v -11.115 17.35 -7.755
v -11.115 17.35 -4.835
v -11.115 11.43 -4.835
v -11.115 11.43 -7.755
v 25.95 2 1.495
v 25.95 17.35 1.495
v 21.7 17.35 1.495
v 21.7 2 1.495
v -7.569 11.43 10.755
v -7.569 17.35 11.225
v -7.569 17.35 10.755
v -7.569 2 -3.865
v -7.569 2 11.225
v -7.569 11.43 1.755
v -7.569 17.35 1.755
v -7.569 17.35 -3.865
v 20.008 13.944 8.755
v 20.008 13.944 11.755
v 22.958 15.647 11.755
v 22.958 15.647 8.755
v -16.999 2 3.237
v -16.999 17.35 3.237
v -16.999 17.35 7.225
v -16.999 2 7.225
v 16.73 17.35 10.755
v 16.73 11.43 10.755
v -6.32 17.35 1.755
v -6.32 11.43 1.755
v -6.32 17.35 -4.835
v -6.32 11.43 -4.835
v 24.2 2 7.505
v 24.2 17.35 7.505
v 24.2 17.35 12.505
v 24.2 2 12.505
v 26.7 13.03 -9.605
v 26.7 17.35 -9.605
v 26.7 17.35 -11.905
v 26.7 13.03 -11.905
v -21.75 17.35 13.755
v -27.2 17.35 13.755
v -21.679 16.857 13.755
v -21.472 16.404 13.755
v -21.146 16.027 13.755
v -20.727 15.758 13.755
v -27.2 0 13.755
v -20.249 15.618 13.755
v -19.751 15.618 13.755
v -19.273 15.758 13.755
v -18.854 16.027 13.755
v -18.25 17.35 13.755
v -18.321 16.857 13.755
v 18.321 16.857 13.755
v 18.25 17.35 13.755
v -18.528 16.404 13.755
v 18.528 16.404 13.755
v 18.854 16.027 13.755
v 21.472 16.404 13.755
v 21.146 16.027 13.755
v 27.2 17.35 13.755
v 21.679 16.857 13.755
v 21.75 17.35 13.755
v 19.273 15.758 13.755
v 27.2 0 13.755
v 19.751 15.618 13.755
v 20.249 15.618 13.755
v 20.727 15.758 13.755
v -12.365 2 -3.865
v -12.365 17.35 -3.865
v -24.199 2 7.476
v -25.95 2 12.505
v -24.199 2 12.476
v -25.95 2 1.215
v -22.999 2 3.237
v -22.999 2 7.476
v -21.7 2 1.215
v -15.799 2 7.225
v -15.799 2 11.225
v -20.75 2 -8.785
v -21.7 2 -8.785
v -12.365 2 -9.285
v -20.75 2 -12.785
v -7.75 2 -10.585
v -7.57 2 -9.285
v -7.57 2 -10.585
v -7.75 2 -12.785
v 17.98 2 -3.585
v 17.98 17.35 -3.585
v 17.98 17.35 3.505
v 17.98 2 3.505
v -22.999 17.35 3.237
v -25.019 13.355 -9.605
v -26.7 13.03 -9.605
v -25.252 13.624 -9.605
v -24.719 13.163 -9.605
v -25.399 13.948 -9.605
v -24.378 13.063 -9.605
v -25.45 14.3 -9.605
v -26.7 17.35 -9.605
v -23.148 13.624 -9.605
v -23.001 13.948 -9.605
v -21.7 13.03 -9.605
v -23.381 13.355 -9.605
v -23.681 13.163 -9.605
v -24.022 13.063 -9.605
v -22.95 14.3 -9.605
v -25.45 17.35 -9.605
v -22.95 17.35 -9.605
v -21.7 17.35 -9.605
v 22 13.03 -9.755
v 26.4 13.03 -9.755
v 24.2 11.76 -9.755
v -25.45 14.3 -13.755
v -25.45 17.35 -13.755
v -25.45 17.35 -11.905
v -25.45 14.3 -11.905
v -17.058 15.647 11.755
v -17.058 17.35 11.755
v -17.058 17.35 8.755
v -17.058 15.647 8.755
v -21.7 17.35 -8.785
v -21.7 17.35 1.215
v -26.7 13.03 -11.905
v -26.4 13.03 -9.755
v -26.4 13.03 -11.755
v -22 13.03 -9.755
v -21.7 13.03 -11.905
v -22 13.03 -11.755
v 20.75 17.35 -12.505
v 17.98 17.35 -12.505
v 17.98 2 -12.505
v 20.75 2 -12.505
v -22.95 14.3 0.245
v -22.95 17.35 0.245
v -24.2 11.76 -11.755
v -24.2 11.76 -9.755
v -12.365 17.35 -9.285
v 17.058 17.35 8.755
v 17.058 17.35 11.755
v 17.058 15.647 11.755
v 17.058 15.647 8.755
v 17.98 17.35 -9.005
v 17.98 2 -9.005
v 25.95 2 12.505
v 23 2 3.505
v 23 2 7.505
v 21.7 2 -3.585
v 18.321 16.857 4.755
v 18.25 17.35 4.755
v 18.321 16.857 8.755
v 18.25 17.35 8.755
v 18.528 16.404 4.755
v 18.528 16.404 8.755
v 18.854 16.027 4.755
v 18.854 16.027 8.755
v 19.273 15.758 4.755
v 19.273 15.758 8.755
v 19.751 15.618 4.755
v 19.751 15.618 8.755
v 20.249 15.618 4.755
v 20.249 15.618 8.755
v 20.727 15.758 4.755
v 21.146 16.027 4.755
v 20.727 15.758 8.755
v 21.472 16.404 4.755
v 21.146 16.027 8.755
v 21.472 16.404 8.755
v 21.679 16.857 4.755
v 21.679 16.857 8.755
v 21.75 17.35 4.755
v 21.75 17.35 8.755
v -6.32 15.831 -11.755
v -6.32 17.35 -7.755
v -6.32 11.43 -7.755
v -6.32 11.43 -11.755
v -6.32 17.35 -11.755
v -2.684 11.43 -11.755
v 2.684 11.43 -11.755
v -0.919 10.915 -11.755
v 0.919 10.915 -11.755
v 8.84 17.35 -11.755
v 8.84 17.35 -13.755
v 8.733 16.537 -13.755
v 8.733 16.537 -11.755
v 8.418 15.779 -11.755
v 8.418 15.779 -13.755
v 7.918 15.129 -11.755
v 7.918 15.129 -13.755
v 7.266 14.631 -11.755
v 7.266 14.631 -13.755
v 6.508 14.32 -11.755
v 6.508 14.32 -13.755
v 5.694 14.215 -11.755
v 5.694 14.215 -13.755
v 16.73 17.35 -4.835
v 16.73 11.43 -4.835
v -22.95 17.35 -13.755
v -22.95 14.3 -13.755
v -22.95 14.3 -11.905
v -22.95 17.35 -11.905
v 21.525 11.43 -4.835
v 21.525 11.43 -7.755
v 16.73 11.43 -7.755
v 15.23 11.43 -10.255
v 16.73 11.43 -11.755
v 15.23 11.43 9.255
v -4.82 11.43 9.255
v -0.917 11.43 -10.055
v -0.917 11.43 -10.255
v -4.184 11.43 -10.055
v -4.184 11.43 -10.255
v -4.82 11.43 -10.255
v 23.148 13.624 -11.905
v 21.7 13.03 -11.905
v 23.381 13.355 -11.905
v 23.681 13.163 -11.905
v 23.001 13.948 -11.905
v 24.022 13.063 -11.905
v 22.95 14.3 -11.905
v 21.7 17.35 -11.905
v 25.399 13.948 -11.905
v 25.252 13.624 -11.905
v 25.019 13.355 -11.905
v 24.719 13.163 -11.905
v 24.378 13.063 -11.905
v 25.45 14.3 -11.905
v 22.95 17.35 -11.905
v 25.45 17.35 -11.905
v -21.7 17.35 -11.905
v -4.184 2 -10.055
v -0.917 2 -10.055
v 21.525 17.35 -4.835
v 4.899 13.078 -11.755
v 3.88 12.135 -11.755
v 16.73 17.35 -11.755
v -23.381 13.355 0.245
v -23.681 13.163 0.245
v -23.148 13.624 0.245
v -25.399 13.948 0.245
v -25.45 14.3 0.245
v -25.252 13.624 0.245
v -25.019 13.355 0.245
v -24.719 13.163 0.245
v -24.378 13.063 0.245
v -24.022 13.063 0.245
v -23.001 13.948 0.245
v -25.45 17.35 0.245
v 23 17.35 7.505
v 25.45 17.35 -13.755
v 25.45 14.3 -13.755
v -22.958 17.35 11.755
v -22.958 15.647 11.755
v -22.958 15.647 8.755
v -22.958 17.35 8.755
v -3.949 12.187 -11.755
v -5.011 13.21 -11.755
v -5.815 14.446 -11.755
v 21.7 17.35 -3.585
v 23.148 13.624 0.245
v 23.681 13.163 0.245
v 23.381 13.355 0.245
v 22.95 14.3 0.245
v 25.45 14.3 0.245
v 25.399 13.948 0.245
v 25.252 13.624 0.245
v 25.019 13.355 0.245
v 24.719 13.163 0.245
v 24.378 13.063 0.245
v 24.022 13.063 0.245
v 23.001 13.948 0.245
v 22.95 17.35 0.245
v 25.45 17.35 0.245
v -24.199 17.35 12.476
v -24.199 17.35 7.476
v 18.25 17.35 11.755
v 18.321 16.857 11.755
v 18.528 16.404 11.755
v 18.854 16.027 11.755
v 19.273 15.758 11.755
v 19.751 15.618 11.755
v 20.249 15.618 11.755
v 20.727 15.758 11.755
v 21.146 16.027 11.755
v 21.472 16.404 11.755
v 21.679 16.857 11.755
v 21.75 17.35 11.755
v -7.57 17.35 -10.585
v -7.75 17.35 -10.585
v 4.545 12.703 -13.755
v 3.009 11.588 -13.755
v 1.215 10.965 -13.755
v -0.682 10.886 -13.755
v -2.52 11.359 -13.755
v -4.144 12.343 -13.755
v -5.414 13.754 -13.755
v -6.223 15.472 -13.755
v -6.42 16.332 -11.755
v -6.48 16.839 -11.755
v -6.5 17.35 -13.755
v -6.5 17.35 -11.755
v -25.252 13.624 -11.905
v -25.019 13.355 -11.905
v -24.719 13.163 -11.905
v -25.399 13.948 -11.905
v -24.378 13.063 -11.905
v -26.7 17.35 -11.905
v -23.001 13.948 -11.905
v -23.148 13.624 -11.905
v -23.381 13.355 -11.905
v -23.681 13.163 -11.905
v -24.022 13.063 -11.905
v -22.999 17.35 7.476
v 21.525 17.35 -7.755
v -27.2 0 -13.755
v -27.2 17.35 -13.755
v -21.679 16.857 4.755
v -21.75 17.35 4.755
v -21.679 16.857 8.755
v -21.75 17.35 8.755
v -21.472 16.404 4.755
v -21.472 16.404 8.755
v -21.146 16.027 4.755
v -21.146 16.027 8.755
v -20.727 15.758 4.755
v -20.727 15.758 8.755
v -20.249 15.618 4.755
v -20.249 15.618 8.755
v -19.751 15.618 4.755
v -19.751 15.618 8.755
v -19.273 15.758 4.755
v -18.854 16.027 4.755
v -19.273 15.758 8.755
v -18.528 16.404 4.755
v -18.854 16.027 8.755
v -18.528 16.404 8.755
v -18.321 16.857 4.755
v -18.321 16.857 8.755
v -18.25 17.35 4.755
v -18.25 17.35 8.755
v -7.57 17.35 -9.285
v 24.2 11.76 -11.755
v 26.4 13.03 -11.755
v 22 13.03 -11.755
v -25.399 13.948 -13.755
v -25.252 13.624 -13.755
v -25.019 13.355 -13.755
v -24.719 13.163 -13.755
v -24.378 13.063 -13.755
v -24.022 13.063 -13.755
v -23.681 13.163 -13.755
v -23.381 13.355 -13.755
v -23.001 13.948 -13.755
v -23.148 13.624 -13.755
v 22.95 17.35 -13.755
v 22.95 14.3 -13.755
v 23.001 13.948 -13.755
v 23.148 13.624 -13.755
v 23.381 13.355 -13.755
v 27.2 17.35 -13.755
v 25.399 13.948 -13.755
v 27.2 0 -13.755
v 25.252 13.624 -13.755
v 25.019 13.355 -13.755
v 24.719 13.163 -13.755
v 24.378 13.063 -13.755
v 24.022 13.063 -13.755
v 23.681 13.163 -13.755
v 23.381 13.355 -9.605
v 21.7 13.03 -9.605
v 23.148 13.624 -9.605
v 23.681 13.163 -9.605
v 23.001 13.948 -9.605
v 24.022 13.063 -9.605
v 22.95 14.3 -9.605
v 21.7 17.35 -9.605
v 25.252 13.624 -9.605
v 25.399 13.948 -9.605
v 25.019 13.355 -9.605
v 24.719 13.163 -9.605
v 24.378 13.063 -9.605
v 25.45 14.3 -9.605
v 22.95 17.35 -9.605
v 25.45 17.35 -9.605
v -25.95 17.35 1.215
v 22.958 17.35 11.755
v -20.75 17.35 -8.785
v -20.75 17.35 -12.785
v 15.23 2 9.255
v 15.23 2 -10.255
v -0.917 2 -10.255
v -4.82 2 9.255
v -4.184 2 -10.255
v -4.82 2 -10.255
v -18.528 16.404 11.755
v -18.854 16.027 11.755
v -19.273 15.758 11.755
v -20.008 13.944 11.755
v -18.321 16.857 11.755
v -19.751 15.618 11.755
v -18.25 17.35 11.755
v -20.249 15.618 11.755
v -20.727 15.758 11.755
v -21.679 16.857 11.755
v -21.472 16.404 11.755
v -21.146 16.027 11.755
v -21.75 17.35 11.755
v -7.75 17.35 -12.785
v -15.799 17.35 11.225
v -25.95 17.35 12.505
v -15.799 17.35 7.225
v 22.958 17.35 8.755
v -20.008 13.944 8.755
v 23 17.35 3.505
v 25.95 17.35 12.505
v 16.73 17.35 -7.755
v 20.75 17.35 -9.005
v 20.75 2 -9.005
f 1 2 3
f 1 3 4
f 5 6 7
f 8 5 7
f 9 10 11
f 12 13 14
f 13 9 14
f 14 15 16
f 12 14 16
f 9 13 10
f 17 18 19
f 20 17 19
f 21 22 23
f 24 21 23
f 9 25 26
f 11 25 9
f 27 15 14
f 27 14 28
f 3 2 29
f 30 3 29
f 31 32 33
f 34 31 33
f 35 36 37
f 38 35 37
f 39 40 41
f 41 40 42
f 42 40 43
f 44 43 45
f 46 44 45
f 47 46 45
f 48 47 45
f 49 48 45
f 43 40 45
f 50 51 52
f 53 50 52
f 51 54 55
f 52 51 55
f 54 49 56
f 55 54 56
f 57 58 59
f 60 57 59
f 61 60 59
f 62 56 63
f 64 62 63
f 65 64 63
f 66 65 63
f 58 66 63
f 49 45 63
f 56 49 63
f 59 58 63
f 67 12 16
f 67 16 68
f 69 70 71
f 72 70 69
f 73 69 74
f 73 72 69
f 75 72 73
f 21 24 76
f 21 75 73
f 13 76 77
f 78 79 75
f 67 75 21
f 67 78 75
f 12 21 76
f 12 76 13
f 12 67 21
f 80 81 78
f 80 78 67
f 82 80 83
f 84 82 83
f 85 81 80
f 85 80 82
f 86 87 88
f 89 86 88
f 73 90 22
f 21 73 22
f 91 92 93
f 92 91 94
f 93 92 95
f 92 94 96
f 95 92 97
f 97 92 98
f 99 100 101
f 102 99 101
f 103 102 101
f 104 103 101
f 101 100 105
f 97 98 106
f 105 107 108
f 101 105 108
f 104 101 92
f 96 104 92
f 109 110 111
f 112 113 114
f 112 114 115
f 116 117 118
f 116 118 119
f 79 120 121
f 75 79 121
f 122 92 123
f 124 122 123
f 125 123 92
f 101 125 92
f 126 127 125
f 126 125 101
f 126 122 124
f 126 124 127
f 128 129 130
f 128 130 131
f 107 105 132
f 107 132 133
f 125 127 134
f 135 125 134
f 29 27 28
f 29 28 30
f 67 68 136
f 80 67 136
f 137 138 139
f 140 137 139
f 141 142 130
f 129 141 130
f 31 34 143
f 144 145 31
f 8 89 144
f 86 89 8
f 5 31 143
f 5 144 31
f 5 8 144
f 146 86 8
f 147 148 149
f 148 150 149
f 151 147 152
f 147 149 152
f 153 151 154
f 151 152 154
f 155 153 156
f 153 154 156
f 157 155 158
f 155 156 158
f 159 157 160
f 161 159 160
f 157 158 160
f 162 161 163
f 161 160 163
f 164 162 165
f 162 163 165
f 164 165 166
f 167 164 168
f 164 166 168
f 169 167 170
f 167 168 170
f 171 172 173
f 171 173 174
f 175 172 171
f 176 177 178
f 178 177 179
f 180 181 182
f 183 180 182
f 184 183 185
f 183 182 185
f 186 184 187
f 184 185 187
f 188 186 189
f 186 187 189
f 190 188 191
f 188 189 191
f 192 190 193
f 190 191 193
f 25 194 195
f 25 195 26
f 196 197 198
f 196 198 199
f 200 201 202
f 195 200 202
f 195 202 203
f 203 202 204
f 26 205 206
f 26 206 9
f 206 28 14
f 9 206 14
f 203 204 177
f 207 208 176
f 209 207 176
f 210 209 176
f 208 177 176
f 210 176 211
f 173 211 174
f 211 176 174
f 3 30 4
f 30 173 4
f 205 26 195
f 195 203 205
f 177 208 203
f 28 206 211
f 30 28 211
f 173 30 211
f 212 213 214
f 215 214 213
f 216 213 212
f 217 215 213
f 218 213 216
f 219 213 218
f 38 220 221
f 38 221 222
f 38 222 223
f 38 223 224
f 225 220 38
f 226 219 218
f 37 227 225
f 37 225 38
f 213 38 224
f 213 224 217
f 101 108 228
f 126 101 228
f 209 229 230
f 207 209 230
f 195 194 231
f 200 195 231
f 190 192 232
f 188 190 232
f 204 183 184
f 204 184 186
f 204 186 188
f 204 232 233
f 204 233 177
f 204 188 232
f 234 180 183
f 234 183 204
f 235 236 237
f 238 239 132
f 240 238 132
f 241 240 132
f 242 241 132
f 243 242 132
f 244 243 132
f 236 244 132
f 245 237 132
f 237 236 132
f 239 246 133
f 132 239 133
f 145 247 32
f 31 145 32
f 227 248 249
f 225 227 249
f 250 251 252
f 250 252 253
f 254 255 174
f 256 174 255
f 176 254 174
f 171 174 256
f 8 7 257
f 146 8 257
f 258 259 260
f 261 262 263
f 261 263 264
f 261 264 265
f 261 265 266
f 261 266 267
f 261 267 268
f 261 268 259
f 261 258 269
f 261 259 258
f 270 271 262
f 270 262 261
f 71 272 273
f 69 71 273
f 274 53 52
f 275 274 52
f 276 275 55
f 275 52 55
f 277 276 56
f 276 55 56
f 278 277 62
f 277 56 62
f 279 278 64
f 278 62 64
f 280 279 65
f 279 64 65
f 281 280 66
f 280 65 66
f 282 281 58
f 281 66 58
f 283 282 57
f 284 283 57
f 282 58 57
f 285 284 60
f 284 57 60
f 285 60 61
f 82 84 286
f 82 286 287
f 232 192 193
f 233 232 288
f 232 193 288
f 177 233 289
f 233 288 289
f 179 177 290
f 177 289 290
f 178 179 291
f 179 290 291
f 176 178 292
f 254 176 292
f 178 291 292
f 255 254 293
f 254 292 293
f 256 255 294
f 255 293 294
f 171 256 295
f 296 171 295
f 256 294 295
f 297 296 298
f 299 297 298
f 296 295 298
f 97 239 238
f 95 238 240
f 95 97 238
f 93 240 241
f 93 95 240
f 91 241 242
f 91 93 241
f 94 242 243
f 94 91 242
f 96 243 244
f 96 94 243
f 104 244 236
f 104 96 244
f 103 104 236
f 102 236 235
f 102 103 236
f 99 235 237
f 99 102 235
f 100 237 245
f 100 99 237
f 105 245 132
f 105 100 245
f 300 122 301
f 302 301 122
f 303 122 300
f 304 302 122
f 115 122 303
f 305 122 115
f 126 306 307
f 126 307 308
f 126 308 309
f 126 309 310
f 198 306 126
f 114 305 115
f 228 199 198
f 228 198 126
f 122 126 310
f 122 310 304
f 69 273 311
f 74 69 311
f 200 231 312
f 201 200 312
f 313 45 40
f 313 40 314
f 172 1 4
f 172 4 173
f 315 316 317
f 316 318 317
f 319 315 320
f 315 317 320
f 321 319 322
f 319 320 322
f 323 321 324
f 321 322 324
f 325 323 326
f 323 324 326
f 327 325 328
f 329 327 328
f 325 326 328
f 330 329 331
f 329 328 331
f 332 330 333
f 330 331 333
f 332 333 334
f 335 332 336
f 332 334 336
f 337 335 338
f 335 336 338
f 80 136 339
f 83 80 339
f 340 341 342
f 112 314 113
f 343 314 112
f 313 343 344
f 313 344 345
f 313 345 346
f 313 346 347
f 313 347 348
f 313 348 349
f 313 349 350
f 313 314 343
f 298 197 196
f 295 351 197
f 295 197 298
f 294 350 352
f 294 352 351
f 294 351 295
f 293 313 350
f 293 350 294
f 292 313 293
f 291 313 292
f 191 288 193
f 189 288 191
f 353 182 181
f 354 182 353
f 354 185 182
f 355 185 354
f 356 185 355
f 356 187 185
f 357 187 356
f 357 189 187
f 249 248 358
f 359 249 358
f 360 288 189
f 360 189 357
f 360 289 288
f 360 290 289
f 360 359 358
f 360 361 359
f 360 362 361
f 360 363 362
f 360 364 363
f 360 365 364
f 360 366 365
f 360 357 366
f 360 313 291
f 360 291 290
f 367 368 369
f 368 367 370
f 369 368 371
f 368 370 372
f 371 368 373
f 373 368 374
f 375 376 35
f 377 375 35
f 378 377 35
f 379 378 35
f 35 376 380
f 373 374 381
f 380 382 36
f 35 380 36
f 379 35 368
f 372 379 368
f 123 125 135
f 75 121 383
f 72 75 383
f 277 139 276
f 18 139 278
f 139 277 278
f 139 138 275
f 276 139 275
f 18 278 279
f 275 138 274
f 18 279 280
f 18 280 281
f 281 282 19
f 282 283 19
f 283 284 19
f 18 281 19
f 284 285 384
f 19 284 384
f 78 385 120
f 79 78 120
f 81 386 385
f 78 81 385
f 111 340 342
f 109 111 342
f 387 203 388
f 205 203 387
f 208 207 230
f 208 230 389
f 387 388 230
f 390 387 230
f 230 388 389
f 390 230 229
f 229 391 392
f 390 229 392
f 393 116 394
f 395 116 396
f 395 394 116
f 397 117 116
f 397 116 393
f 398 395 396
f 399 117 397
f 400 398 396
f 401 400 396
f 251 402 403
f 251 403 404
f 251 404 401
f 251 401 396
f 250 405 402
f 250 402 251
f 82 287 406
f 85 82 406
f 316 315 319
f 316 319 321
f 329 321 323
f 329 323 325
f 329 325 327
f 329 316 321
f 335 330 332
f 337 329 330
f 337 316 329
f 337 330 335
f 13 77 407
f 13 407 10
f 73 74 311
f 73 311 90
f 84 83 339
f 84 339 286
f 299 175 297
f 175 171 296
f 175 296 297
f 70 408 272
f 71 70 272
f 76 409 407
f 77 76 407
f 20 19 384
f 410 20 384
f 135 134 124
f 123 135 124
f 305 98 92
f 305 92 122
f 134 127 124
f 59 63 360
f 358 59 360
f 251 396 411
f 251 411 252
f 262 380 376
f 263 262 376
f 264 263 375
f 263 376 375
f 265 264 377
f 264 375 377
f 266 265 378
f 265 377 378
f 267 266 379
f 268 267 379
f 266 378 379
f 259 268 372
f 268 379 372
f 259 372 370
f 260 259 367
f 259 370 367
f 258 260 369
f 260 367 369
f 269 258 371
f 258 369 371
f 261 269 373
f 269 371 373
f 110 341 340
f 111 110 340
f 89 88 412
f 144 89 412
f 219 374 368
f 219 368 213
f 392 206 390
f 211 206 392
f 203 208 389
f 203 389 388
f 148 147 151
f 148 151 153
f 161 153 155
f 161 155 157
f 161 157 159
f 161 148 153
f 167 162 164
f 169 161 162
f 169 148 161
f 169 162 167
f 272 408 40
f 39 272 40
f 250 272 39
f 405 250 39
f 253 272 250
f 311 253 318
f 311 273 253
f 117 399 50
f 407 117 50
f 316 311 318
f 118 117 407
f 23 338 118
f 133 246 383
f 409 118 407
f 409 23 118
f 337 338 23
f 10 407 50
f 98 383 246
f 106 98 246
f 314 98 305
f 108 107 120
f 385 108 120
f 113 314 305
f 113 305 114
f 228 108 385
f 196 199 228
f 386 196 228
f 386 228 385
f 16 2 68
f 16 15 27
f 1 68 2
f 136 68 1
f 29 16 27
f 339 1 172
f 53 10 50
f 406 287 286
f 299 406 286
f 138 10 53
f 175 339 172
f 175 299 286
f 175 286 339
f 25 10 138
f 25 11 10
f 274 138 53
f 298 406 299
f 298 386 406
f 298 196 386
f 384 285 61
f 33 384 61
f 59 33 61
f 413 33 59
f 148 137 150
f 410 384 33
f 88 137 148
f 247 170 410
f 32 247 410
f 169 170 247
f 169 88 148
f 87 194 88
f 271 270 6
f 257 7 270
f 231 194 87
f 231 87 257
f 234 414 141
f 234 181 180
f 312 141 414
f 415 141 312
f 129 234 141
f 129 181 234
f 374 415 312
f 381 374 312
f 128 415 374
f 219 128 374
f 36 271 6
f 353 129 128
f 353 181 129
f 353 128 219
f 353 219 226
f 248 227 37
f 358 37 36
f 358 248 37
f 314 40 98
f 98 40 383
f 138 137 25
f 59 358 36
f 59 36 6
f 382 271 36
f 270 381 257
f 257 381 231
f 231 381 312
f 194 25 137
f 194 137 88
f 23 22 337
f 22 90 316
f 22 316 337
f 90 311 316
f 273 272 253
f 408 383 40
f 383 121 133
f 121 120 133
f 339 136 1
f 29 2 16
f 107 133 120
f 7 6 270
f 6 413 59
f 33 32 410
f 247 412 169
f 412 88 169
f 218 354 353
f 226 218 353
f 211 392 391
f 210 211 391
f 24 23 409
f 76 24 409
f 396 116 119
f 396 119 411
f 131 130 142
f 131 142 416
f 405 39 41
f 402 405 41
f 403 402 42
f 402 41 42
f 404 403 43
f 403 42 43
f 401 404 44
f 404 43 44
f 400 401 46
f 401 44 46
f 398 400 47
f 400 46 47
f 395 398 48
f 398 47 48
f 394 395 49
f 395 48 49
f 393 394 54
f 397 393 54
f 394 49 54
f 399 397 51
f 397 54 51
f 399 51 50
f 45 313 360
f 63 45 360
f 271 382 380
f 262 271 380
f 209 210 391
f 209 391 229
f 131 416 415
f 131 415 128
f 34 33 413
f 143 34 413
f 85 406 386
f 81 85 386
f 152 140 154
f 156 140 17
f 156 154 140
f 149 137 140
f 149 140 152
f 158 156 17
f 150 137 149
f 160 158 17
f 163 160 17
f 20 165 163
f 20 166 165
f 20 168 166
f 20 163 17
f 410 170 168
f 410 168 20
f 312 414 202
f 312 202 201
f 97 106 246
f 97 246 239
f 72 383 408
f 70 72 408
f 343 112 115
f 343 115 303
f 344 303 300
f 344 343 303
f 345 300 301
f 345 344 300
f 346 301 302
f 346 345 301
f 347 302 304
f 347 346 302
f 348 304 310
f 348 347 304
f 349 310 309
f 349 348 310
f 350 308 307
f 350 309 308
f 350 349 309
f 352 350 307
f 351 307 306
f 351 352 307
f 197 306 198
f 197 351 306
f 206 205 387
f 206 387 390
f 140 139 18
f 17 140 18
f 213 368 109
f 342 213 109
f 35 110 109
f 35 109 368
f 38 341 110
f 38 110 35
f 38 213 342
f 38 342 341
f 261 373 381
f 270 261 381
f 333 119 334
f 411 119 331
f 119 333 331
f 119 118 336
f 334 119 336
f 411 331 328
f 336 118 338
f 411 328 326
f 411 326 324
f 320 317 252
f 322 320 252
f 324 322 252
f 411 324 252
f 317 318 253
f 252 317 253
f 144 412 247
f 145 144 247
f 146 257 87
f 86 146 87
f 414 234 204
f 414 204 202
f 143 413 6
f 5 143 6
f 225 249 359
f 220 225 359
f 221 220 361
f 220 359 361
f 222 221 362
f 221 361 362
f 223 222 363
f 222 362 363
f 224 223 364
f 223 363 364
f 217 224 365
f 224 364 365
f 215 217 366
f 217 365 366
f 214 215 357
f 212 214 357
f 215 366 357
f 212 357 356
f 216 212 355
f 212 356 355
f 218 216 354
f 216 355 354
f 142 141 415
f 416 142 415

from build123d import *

# Parameters (mm, degrees)
SKETCH1_W           = 54.3999928
SKETCH1_H           = 27.5100034
BOSS_EXTRUDE1_DEPTH = 17.3500034
CUT_EXTRUDE1_DEPTH  = 15.3500074
CUT_EXTRUDE2_DEPTH  = 5.9200034
CUT_EXTRUDE3_DEPTH  = 9.430004
SKETCH5_W           = 4.795012
SKETCH5_H           = 2.9200094
CUT_EXTRUDE4_DEPTH  = 5.9200034
SKETCH6_W           = 2.769997
SKETCH6_H           = 3.499993
CUT_EXTRUDE5_DEPTH  = 15.3500074
CUT_EXTRUDE6_DEPTH  = 15.3500074
SKETCH8_R           = 1.7499965
CUT_EXTRUDE7_DEPTH  = 9.0000074
CUT_EXTRUDE8_DEPTH  = 13.9999974
SKETCH10_W          = 4.99999
SKETCH10_H          = 2.2999954
CUT_EXTRUDE9_DEPTH  = 4.320159
CUT_EXTRUDE10_DEPTH = 1.999996
CUT_EXTRUDE11_DEPTH = 2.999994
CUT_EXTRUDE12_DEPTH = 1.999996


with BuildPart() as part:
    # Sketch1 → Boss-Extrude1 (new body)
    with BuildSketch(Plane(origin=(0, 0, 0), x_dir=(1, 0, 0), z_dir=(0, 1, 0))):
        Rectangle(SKETCH1_W, SKETCH1_H)
    extrude(amount=BOSS_EXTRUDE1_DEPTH)

    # Sketch2 → Cut-Extrude1 (cut)
    with BuildSketch(Plane(origin=(0, 17.3500034, 0), x_dir=(1, 0, 0), z_dir=(0, 1, 0))):
        Polygon((-7.7499972, 12.7852805), (-20.7499966, 12.7852805), (-20.7499712, 8.7852885), (-21.699982, 8.7852885), (-21.699982, -1.2147169), (-25.9499862, -1.2147169), (-25.9499862, -12.5049915), (-24.199309728, -12.476075327), (-24.199309728, -7.476085327), (-22.999312128, -7.476085327), (-22.999312128, -3.2369379), (-16.999324128, -3.2369379), (-16.999324128, -7.2247379), (-15.799326528, -7.2247379), (-15.799326528, -11.2247299), (-7.569320128, -11.2247299), (-7.569320128, 3.8652831), (-12.364974, 3.8652831), (-12.364974, 9.2852875), (-7.5699874, 9.2852875), (-7.5699874, 10.5852849), (-7.7499972, 10.5852849), align=None)
    extrude(amount=-CUT_EXTRUDE1_DEPTH, mode=Mode.SUBTRACT)

    # Sketch3 → Cut-Extrude2 (cut)
    with BuildSketch(Plane(origin=(0, 17.3500034, 0), x_dir=(1, 0, 0), z_dir=(0, 1, 0))):
        Polygon((-7.5699874, -10.7550077), (-7.5699874, -1.7550003), (-6.3199772, -1.7550003), (-6.3199772, 11.7550057), (16.7300148, 11.7550057), (16.7300148, -10.7550077), align=None)
    extrude(amount=-CUT_EXTRUDE2_DEPTH, mode=Mode.SUBTRACT)

    # Sketch4 → Cut-Extrude3 (cut)
    with BuildSketch(Plane(origin=(0, 11.43, 0), x_dir=(1, 0, 0), z_dir=(0, 1, 0))):
        Polygon((15.2300178, 10.2550087), (15.2300178, -9.2549853), (-4.8199802, -9.2549853), (-4.8199802, 10.2550087), (-4.1839388, 10.2550087), (-4.1839388, 10.0550091), (-0.916671965, 10.0550091), (-0.916671965, 10.2550087), align=None)
    extrude(amount=-CUT_EXTRUDE3_DEPTH, mode=Mode.SUBTRACT)

    # Sketch5 → Cut-Extrude4 (cut)
    with BuildSketch(Plane(origin=(0, 17.3500034, 0), x_dir=(1, 0, 0), z_dir=(0, 1, 0))):
        with Locations((-8.7174832, 6.2949836)):
            Rectangle(SKETCH5_W, SKETCH5_H)
        with Locations((19.1275208, 6.2949836)):
            Rectangle(SKETCH5_W, SKETCH5_H)
    extrude(amount=-CUT_EXTRUDE4_DEPTH, mode=Mode.SUBTRACT)

    # Sketch6 → Cut-Extrude5 (cut)
    with BuildSketch(Plane(origin=(0, 17.3500034, 0), x_dir=(1, 0, 0), z_dir=(0, 1, 0))):
        with Locations((19.3649981, 10.754995)):
            Rectangle(SKETCH6_W, SKETCH6_H)
    extrude(amount=-CUT_EXTRUDE5_DEPTH, mode=Mode.SUBTRACT)

    # Sketch7 → Cut-Extrude6 (cut)
    with BuildSketch(Plane(origin=(0, 17.3500034, 0), x_dir=(1, 0, 0), z_dir=(0, 1, 0))):
        Polygon((21.7000074, 3.5849941), (17.9799996, 3.5849941), (17.9799996, -3.5050095), (23.0000048, -3.5050095), (23.0000048, -7.5050015), (24.2000024, -7.5050015), (24.2000024, -12.5049915), (25.9500116, -12.5049915), (25.9500116, -1.4949805), (21.7000074, -1.4949805), align=None)
    extrude(amount=-CUT_EXTRUDE6_DEPTH, mode=Mode.SUBTRACT)

    # Sketch8 → Cut-Extrude7 (cut)
    with BuildSketch(Plane.XY.offset(13.7550017)):
        with Locations((-19.9999981, 17.3500034)):
            Circle(SKETCH8_R)
        with Locations((19.9999981, 17.3500034)):
            Circle(SKETCH8_R)
    extrude(amount=-CUT_EXTRUDE7_DEPTH, mode=Mode.SUBTRACT)

    # Sketch9 → Cut-Extrude8 (cut)
    with BuildSketch(Plane(origin=(0, 0, -13.7550017), x_dir=(-1, 0, 0), z_dir=(0, 0, -1))):
        with BuildLine():
            Line((-25.4499872, 17.3500034), (-25.4499872, 14.2999968))
            ThreePointArc((-25.4499872, 14.2999968), (-24.1999897, 13.0499993), (-22.9499922, 14.2999968))
            Line((-22.9499922, 14.2999968), (-22.9499922, 17.3500034))
            Line((-22.9499922, 17.3500034), (-25.4499872, 17.3500034))
        make_face()
        with BuildLine():
            Line((22.9499922, 17.3500034), (25.4499872, 17.3500034))
            Line((25.4499872, 17.3500034), (25.4499872, 14.2999968))
            ThreePointArc((25.4499872, 14.2999968), (24.1999897, 13.0499993), (22.9499922, 14.2999968))
            Line((22.9499922, 14.2999968), (22.9499922, 17.3500034))
        make_face()
    extrude(amount=-CUT_EXTRUDE8_DEPTH, mode=Mode.SUBTRACT)

    # Sketch10 → Cut-Extrude9 (cut)
    with BuildSketch(Plane(origin=(0, 17.3500034, 0), x_dir=(1, 0, 0), z_dir=(0, 1, 0))):
        with Locations((-24.2000024, 10.754995)):
            Rectangle(SKETCH10_W, SKETCH10_H)
        with Locations((24.2000024, 10.754995)):
            Rectangle(SKETCH10_W, SKETCH10_H)
    extrude(amount=-CUT_EXTRUDE9_DEPTH, mode=Mode.SUBTRACT)

    # Sketch11 → Cut-Extrude10 (cut)
    with BuildSketch(Plane(origin=(0, 0, -11.7550057), x_dir=(-1, 0, 0), z_dir=(0, 0, -1))):
        Polygon((-26.399998, 13.0298444), (-24.2000024, 11.7596666), (-22.0000068, 13.0298444), align=None)
        Polygon((22.0000068, 13.0298444), (24.2000024, 11.7596666), (26.399998, 13.0298444), align=None)
    extrude(amount=-CUT_EXTRUDE10_DEPTH, mode=Mode.SUBTRACT)

    # Sketch13 → Cut-Extrude11 (cut)
    with BuildSketch(Plane.XY.offset(11.7550057)):
        Polygon((-22.9581964, 17.3500034), (-17.0581828, 17.3500034), (-17.0581828, 15.6468318), (-20.0081896, 13.9436602), (-22.9581964, 15.6468318), align=None)
        Polygon((17.0581828, 15.6468318), (20.0081896, 13.9436602), (22.9581964, 15.6468318), (22.9581964, 17.3500034), (17.0581828, 17.3500034), align=None)
    extrude(amount=-CUT_EXTRUDE11_DEPTH, mode=Mode.SUBTRACT)

    # Sketch14 → Cut-Extrude12 (cut)
    with BuildSketch(Plane(origin=(0, 0, -13.7550017), x_dir=(-1, 0, 0), z_dir=(0, 0, -1))):
        with BuildLine():
            Line((-6.499990556, 17.3500034), (-8.8399874, 17.3500034))
            ThreePointArc((-8.8399874, 17.3500034), (-7.917895682, 15.129395373), (-5.694061964, 14.215110549))
            ThreePointArc((-5.694061964, 14.215110549), (-6.295284996, 15.731587965), (-6.499990556, 17.3500034))
        make_face()
        with BuildLine():
            Line((-2.570163008, 17.3500034), (-6.499990556, 17.3500034))
            ThreePointArc((-6.499990556, 17.3500034), (-6.295284996, 15.731587965), (-5.694061964, 14.215110549))
            ThreePointArc((-5.694061964, 14.215110549), (-3.484467177, 15.137182922), (-2.570163008, 17.3500034))
        make_face()
        with BuildLine():
            ThreePointArc((-2.570163008, 17.3500034), (-3.484467177, 15.137182922), (-5.694061964, 14.215110549))
            ThreePointArc((-5.694061964, 14.215110549), (1.618426357, 11.054707482), (6.5000124, 17.3500034))
            Line((6.5000124, 17.3500034), (-2.570163008, 17.3500034))
        make_face()
    extrude(amount=-CUT_EXTRUDE12_DEPTH, mode=Mode.SUBTRACT)


solid = part.part
